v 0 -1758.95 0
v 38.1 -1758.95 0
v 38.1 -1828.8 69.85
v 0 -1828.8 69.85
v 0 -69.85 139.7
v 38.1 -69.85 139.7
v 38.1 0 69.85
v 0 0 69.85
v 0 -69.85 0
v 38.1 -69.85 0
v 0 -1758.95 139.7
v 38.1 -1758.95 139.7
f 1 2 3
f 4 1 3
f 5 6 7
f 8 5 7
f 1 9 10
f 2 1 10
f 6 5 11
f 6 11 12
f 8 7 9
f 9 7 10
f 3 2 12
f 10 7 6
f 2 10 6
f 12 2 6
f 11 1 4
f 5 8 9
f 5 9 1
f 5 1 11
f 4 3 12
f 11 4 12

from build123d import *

# Parameters (mm, degrees)
F0_W     = 38.1
F0_H     = 139.7
F1_DEPTH = 1828.8
F3_DEPTH = 38.101


with BuildPart() as f1:
    # F0 (on Front) → F1 (new body)
    with BuildSketch(Plane.XZ):
        with Locations((19.05, 69.85)):
            Rectangle(F0_W, F0_H)
    extrude(amount=F1_DEPTH)

    # F2 (on face) → F3 (cut, through all)
    with BuildSketch(Plane.YZ.offset(38.1)):
        Polygon((-1758.95, 0), (-1828.8, 69.85), (-1828.8, 0), align=None)
        Polygon((-1828.8, 139.7), (-1828.8, 69.85), (-1758.95, 139.7), align=None)
        Polygon((0, 0), (0, 69.85), (-69.85, 0), align=None)
        Polygon((0, 69.85), (0, 139.7), (-69.85, 139.7), align=None)
    extrude(amount=-F3_DEPTH, mode=Mode.SUBTRACT)


solid = f1.part
